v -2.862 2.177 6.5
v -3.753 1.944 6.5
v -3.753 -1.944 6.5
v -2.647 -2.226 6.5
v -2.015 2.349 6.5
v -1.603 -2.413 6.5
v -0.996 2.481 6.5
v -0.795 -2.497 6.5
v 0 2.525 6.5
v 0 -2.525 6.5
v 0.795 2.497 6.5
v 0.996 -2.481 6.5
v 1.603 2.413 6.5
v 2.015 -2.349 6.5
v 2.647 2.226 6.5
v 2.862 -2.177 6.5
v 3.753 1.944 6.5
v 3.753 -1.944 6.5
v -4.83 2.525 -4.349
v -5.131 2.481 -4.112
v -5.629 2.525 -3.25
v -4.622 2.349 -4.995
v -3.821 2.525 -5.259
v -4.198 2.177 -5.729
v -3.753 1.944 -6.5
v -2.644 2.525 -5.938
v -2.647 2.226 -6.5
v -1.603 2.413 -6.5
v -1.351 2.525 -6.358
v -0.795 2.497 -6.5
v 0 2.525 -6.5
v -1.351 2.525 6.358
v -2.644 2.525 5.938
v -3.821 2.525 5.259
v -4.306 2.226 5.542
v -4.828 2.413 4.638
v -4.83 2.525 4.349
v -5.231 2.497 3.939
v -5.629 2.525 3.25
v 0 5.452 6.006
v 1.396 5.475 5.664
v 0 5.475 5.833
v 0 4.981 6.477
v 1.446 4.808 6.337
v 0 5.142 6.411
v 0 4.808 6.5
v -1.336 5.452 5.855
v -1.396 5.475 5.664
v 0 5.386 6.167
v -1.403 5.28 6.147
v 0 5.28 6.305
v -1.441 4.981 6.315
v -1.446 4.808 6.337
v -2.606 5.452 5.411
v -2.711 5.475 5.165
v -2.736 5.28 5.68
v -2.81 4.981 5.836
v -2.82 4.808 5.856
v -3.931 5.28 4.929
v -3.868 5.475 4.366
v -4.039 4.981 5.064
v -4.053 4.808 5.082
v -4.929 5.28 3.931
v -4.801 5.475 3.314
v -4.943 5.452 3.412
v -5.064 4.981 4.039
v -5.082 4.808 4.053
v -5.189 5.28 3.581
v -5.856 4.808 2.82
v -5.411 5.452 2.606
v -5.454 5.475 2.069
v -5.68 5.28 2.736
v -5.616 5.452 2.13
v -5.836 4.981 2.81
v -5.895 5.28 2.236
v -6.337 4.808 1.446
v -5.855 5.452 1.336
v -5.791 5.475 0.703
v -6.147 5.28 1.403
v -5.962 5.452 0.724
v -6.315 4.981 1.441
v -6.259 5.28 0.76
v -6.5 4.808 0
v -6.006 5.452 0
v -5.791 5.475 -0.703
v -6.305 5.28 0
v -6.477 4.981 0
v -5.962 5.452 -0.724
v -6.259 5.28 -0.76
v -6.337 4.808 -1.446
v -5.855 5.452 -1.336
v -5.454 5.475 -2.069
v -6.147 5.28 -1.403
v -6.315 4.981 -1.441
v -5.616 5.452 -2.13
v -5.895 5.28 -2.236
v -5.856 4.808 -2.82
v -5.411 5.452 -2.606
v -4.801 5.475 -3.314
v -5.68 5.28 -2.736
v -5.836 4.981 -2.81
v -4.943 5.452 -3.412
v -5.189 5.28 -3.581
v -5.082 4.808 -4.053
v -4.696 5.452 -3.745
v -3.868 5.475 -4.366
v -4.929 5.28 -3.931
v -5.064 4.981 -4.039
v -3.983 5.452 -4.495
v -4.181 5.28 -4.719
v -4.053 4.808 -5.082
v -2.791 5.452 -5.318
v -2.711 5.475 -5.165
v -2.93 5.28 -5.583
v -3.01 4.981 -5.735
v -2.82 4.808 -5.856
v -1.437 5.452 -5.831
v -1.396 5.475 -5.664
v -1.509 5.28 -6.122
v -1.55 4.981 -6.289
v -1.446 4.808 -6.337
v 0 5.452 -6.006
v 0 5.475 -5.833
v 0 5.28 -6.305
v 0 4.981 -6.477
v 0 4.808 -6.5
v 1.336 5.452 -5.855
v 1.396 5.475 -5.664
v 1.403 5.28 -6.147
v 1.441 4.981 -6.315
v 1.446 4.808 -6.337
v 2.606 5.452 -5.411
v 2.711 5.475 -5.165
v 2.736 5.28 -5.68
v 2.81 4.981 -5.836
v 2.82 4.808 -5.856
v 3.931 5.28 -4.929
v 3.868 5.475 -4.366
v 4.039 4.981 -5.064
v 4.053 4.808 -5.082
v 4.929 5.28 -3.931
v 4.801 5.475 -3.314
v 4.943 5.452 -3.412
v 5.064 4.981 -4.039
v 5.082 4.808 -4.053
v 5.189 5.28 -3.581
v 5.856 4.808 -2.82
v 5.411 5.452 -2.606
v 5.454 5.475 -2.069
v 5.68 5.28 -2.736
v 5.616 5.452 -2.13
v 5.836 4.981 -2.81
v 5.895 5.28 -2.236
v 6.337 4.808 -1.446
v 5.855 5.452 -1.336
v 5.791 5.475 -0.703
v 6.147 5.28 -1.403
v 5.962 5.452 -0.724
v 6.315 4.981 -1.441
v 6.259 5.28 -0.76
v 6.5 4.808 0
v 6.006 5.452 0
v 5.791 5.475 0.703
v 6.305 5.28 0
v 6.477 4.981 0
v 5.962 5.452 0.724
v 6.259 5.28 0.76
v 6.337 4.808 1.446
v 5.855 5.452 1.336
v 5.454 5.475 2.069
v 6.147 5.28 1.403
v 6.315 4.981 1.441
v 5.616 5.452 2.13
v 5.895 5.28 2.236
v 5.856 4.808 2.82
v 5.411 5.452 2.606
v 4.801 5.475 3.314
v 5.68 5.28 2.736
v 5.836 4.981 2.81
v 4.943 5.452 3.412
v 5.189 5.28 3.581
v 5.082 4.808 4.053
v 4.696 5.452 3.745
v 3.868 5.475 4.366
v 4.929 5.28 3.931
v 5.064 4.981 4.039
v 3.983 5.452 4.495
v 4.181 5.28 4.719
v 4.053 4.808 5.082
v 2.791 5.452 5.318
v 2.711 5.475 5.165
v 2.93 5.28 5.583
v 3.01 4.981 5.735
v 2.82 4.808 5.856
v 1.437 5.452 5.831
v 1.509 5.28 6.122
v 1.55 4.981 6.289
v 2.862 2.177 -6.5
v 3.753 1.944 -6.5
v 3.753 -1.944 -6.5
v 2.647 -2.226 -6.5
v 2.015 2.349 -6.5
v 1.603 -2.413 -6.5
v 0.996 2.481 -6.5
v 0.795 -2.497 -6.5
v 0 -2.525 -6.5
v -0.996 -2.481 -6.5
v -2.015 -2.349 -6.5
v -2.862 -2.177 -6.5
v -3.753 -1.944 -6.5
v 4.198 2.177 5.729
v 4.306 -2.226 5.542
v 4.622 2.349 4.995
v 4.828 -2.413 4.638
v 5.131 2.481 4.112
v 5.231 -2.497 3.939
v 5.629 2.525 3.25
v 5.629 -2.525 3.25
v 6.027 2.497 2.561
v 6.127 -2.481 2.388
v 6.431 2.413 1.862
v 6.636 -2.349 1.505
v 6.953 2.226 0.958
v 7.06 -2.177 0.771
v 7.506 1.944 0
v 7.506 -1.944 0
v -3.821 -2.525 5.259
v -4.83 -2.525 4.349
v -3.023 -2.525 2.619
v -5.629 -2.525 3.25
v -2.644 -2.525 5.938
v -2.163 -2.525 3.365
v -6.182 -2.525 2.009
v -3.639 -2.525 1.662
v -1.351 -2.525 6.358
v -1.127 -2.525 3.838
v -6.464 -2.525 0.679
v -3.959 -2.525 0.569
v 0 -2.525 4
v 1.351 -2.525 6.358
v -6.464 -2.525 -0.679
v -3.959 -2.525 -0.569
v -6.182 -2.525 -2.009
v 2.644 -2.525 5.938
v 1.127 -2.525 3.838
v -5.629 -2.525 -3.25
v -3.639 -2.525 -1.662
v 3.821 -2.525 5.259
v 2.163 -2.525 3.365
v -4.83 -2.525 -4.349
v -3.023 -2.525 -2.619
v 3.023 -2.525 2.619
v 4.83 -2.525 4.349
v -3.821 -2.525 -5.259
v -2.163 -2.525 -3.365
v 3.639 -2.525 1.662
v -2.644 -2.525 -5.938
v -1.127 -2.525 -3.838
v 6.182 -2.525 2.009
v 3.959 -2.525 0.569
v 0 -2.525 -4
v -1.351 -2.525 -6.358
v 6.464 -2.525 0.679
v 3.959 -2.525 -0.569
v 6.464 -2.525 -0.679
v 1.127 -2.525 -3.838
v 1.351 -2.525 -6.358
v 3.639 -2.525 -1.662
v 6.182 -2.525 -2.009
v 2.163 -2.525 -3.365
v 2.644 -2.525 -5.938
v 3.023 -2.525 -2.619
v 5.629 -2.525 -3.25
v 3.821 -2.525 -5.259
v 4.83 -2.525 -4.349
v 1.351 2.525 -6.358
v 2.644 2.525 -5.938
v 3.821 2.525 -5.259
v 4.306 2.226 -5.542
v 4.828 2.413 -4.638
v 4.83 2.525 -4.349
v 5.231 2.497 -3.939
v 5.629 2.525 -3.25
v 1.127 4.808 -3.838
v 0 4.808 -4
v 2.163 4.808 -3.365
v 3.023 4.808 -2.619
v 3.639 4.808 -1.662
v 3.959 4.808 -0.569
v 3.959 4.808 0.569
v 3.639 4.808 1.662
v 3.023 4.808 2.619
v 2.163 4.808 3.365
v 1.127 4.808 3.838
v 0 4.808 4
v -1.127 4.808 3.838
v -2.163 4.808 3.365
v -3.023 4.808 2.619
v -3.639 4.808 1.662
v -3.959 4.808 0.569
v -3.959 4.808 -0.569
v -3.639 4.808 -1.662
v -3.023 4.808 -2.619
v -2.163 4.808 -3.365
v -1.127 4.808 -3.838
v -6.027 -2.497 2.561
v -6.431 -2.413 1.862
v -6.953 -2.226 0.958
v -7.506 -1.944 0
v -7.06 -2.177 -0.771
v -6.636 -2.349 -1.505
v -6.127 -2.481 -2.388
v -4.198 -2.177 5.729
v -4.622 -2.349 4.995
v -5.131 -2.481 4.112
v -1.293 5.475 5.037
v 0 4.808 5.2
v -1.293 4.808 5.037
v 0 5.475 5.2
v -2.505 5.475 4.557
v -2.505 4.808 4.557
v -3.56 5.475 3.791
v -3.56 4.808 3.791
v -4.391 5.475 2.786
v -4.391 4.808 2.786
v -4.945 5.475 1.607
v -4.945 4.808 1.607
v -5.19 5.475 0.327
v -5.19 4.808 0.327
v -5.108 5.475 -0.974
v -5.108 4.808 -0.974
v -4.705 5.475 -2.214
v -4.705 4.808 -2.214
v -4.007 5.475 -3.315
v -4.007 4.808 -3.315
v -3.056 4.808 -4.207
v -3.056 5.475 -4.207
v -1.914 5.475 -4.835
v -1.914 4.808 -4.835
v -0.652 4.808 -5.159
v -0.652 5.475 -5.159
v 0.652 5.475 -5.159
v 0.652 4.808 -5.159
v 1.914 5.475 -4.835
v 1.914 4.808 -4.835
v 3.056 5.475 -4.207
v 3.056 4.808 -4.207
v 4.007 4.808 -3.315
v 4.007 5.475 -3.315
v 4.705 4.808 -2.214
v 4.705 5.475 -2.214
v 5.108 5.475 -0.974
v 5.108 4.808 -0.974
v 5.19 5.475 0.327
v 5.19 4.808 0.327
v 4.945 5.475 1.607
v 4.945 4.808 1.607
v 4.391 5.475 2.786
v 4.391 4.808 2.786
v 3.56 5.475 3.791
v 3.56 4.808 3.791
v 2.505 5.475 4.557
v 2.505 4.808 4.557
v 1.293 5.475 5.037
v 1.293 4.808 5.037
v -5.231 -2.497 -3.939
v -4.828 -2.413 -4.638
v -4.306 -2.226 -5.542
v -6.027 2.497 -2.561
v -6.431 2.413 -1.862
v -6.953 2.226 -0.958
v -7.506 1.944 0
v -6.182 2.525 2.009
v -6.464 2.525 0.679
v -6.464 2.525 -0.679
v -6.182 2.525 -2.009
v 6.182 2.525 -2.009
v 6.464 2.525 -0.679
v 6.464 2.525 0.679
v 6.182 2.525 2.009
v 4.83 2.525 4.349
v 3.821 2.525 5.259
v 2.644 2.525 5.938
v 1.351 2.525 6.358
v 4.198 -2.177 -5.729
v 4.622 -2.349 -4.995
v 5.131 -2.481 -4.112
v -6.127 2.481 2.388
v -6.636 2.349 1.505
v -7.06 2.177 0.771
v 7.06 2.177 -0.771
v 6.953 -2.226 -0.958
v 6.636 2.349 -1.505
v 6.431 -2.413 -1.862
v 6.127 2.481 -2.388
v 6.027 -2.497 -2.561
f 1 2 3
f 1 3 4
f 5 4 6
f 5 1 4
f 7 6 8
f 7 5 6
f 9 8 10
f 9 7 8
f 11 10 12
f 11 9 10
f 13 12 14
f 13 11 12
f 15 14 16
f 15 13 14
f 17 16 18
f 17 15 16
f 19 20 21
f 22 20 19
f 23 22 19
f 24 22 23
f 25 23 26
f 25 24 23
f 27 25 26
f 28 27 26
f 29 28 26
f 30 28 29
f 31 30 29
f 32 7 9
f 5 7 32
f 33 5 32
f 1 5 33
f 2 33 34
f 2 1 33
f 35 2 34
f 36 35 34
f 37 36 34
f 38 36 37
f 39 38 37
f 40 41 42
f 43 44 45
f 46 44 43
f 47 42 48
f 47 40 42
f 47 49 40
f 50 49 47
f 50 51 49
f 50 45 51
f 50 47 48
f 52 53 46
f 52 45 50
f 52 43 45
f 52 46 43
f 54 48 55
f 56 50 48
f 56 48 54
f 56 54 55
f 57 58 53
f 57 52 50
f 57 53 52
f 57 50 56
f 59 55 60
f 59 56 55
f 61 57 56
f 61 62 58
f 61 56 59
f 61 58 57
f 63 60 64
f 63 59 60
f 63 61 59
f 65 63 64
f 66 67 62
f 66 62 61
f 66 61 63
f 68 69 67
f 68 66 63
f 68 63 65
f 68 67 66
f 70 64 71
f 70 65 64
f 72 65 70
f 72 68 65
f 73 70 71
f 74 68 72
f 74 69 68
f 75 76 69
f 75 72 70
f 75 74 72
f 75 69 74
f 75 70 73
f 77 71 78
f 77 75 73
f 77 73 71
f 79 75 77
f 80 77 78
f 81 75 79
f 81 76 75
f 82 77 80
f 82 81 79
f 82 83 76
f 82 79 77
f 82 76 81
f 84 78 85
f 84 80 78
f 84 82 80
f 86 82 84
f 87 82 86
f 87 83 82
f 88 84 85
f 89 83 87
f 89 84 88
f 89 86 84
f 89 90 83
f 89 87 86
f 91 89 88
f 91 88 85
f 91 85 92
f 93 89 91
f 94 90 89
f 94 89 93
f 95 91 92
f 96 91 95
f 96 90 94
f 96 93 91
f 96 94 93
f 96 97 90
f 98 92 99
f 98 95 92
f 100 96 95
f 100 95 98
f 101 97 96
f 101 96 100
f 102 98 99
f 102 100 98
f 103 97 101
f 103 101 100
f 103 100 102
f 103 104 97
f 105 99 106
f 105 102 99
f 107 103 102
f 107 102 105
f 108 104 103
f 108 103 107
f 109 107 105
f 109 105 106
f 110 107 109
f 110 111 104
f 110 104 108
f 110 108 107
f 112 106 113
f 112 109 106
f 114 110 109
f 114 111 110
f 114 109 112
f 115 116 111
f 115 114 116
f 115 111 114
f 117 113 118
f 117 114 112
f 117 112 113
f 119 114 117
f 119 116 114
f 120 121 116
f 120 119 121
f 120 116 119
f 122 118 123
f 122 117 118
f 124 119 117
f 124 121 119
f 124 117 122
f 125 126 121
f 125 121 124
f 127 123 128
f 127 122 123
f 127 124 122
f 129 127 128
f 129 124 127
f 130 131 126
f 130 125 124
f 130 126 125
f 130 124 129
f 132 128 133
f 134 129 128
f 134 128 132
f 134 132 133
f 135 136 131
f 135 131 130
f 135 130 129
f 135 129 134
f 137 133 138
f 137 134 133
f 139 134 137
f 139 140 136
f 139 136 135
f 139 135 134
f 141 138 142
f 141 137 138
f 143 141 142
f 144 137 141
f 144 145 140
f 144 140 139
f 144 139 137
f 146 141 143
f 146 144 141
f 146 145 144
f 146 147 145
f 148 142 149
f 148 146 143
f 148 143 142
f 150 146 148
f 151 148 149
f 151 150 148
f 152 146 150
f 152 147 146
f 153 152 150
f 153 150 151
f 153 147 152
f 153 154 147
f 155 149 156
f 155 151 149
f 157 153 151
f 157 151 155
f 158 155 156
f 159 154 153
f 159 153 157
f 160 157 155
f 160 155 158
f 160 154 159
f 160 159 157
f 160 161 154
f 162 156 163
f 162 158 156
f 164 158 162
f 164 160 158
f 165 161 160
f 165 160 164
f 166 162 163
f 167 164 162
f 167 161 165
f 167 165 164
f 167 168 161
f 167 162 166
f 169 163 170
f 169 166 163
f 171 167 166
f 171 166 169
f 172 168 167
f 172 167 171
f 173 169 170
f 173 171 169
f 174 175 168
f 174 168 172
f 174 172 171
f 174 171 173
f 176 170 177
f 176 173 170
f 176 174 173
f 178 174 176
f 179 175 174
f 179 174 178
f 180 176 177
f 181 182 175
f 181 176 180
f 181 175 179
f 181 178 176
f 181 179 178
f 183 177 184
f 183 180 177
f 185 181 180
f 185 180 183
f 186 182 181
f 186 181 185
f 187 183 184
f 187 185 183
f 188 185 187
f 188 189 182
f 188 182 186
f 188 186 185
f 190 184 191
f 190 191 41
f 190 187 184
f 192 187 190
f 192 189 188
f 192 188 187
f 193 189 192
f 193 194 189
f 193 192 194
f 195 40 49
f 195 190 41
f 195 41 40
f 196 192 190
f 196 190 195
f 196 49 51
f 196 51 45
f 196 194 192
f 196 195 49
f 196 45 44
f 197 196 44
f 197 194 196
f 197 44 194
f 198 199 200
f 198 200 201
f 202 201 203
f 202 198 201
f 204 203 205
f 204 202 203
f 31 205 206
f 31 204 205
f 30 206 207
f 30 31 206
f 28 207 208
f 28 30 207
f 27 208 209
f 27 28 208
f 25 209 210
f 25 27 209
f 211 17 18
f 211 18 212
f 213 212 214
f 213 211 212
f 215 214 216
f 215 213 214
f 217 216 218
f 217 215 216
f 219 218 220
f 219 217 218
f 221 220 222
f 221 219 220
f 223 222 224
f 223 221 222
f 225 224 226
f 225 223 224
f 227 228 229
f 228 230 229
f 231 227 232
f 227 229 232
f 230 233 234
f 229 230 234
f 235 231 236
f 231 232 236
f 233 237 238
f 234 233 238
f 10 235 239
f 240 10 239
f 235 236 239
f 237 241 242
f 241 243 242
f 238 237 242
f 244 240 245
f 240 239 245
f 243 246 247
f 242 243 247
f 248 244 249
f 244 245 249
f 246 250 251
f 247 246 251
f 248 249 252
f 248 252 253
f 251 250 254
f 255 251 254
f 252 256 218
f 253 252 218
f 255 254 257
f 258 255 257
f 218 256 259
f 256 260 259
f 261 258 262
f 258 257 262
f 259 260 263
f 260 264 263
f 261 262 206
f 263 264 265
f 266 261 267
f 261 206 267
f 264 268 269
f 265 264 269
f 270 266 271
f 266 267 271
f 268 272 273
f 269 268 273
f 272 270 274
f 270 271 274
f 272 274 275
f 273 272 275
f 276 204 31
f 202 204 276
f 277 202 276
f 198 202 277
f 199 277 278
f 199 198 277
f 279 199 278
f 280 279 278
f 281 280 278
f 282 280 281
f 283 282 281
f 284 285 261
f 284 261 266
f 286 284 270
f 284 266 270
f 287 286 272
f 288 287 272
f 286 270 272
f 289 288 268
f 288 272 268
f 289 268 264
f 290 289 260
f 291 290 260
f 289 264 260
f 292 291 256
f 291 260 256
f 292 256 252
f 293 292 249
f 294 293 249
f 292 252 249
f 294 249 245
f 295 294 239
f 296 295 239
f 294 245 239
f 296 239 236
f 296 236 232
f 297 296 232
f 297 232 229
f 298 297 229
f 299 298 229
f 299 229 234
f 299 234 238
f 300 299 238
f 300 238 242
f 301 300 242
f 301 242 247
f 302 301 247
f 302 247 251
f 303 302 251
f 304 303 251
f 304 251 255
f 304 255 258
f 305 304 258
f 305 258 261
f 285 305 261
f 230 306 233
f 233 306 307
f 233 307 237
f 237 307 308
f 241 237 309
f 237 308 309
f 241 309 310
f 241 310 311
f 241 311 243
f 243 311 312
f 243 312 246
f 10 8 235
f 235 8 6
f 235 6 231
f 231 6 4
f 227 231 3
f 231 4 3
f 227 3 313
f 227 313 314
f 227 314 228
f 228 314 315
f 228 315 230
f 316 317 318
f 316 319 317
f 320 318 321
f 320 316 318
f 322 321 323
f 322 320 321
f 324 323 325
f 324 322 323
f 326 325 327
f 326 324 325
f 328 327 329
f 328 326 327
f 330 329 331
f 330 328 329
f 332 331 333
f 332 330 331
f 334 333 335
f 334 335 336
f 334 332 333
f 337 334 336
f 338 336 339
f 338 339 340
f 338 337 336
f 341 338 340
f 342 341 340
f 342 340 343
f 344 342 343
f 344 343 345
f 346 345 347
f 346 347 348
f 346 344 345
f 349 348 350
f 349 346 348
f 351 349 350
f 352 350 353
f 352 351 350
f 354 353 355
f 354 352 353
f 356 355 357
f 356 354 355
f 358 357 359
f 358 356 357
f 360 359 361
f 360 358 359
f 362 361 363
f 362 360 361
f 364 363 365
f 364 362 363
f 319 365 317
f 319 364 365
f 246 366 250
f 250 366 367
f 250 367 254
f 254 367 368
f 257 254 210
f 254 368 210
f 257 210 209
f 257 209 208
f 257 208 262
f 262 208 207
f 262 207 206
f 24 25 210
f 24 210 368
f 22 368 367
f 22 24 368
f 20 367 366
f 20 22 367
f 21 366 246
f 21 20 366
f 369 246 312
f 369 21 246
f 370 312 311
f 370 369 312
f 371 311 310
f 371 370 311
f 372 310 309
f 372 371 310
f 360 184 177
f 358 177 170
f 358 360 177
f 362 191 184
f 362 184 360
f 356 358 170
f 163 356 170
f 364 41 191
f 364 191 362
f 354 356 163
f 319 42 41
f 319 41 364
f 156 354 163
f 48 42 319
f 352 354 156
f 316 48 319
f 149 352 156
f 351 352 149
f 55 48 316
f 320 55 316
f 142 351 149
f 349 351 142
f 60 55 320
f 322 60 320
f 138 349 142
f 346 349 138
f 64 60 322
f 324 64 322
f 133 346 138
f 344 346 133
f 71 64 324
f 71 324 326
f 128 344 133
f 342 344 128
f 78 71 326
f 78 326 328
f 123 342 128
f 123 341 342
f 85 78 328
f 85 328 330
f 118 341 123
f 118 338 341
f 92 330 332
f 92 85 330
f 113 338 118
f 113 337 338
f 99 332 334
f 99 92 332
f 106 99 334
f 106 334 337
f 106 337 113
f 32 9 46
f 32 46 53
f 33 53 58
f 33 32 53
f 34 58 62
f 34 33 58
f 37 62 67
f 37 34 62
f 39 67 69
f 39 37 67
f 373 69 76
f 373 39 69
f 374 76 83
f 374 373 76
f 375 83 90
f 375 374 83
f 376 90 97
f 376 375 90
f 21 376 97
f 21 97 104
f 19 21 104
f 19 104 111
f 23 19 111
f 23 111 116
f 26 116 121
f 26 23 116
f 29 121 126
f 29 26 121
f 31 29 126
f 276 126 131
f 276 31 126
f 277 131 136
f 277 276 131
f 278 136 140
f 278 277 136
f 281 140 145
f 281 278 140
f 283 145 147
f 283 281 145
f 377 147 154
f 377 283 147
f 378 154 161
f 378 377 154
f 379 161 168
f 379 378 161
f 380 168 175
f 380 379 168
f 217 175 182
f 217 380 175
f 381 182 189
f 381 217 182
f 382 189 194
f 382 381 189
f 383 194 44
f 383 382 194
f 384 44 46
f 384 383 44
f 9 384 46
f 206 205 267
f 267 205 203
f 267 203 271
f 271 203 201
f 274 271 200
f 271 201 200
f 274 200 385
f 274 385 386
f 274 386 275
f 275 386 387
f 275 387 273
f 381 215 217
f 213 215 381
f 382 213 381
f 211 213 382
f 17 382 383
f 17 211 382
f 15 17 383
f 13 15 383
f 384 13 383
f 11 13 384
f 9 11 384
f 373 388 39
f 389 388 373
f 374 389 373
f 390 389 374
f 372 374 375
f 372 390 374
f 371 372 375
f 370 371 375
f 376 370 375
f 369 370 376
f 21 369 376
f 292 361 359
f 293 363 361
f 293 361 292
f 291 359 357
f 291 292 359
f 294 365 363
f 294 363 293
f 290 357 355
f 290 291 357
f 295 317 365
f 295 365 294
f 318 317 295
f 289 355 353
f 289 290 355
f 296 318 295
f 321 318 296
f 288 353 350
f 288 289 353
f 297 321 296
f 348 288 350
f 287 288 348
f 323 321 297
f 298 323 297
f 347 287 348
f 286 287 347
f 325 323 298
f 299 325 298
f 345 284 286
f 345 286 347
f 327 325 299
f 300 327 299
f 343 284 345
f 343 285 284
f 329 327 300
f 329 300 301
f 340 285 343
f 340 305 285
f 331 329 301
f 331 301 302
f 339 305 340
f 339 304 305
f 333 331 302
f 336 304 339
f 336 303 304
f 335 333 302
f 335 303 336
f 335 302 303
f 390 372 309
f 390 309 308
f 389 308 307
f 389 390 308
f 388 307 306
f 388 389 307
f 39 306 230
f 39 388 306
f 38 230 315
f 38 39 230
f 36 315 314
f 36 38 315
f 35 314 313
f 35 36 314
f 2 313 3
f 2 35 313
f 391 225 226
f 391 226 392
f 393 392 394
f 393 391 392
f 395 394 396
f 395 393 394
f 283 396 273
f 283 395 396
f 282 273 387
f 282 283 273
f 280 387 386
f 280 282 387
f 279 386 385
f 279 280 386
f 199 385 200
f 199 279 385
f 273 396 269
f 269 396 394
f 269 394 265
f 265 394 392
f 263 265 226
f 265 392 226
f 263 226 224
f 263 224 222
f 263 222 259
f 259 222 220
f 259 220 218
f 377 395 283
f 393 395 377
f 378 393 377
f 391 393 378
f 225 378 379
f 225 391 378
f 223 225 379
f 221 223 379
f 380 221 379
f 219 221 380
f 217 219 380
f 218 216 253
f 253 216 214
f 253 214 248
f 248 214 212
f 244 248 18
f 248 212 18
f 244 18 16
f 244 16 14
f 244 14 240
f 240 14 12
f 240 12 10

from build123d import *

# Parameters (mm, degrees)
EXTRUDE1_DEPTH     = 2.525
CUT_EXTRUDE1_REACH = 14.751
SKETCH4_R          = 4


with BuildPart() as part:
    # Sketch1 → Extrude1 (new, symmetric)
    with BuildSketch(Plane(origin=(0, 0, 0), x_dir=(1, 0, 0), z_dir=(0, 1, 0))):
        Polygon((3.75277675, 6.5), (-3.75277675, 6.5), (-7.505553499, 0), (-3.75277675, -6.5), (3.75277675, -6.5), (7.505553499, 0), align=None)
    extrude(amount=EXTRUDE1_DEPTH, both=True)

    # Sketch2 → Cut-Revolve1 (revolve, cut)
    with BuildSketch(Plane.XY):
        Polygon((7.505553499, 2.525), (6.5, 2.525), (7.505553499, 1.944443416), align=None)
    cut_revolve1 = revolve(axis=Axis((0, 2.75, 0), (0, -1, 0)), mode=Mode.SUBTRACT)

    # Mirror1: Cut-Revolve1 across plane
    add(cut_revolve1.mirror(Plane.ZX), mode=Mode.SUBTRACT)

    # Sketch3 → Revolve1 (revolve)
    with BuildSketch(Plane.XY, mode=Mode.PRIVATE) as revolve1_sk:
        with BuildLine():
            Line((0, 2.525), (0, 4.808333333))
            Line((0, 4.808333333), (5.2, 4.808333333))
            Line((5.2, 4.808333333), (5.2, 5.475))
            Line((5.2, 5.475), (5.833333333, 5.475))
            ThreePointArc((5.833333333, 5.475), (6.304737854, 5.279737854), (6.5, 4.808333333))
            Line((6.5, 4.808333333), (6.5, 2.525))
            Line((6.5, 2.525), (0, 2.525))
        make_face()
    revolve(revolve1_sk.sketch.rotate(Axis((0, 2.75, 0), (0, -1, 0)), 90), axis=Axis((0, 2.75, 0), (0, -1, 0)))

    # Sketch4 → Cut-Extrude1 (cut, up to next)
    with BuildSketch(Plane.XZ.offset(2.525), mode=Mode.PRIVATE) as cut_extrude1_sk1:
        with Locations(Location((0, 0, 0), (0, 0, 270))):
            Circle(SKETCH4_R)
    cut_extrude1_tool1 = extrude(cut_extrude1_sk1.sketch, amount=-CUT_EXTRUDE1_REACH, mode=Mode.PRIVATE) & part.part
    add(cut_extrude1_tool1.solids().sort_by_distance((0, -2.525, 0))[0], mode=Mode.SUBTRACT)


solid = part.part
